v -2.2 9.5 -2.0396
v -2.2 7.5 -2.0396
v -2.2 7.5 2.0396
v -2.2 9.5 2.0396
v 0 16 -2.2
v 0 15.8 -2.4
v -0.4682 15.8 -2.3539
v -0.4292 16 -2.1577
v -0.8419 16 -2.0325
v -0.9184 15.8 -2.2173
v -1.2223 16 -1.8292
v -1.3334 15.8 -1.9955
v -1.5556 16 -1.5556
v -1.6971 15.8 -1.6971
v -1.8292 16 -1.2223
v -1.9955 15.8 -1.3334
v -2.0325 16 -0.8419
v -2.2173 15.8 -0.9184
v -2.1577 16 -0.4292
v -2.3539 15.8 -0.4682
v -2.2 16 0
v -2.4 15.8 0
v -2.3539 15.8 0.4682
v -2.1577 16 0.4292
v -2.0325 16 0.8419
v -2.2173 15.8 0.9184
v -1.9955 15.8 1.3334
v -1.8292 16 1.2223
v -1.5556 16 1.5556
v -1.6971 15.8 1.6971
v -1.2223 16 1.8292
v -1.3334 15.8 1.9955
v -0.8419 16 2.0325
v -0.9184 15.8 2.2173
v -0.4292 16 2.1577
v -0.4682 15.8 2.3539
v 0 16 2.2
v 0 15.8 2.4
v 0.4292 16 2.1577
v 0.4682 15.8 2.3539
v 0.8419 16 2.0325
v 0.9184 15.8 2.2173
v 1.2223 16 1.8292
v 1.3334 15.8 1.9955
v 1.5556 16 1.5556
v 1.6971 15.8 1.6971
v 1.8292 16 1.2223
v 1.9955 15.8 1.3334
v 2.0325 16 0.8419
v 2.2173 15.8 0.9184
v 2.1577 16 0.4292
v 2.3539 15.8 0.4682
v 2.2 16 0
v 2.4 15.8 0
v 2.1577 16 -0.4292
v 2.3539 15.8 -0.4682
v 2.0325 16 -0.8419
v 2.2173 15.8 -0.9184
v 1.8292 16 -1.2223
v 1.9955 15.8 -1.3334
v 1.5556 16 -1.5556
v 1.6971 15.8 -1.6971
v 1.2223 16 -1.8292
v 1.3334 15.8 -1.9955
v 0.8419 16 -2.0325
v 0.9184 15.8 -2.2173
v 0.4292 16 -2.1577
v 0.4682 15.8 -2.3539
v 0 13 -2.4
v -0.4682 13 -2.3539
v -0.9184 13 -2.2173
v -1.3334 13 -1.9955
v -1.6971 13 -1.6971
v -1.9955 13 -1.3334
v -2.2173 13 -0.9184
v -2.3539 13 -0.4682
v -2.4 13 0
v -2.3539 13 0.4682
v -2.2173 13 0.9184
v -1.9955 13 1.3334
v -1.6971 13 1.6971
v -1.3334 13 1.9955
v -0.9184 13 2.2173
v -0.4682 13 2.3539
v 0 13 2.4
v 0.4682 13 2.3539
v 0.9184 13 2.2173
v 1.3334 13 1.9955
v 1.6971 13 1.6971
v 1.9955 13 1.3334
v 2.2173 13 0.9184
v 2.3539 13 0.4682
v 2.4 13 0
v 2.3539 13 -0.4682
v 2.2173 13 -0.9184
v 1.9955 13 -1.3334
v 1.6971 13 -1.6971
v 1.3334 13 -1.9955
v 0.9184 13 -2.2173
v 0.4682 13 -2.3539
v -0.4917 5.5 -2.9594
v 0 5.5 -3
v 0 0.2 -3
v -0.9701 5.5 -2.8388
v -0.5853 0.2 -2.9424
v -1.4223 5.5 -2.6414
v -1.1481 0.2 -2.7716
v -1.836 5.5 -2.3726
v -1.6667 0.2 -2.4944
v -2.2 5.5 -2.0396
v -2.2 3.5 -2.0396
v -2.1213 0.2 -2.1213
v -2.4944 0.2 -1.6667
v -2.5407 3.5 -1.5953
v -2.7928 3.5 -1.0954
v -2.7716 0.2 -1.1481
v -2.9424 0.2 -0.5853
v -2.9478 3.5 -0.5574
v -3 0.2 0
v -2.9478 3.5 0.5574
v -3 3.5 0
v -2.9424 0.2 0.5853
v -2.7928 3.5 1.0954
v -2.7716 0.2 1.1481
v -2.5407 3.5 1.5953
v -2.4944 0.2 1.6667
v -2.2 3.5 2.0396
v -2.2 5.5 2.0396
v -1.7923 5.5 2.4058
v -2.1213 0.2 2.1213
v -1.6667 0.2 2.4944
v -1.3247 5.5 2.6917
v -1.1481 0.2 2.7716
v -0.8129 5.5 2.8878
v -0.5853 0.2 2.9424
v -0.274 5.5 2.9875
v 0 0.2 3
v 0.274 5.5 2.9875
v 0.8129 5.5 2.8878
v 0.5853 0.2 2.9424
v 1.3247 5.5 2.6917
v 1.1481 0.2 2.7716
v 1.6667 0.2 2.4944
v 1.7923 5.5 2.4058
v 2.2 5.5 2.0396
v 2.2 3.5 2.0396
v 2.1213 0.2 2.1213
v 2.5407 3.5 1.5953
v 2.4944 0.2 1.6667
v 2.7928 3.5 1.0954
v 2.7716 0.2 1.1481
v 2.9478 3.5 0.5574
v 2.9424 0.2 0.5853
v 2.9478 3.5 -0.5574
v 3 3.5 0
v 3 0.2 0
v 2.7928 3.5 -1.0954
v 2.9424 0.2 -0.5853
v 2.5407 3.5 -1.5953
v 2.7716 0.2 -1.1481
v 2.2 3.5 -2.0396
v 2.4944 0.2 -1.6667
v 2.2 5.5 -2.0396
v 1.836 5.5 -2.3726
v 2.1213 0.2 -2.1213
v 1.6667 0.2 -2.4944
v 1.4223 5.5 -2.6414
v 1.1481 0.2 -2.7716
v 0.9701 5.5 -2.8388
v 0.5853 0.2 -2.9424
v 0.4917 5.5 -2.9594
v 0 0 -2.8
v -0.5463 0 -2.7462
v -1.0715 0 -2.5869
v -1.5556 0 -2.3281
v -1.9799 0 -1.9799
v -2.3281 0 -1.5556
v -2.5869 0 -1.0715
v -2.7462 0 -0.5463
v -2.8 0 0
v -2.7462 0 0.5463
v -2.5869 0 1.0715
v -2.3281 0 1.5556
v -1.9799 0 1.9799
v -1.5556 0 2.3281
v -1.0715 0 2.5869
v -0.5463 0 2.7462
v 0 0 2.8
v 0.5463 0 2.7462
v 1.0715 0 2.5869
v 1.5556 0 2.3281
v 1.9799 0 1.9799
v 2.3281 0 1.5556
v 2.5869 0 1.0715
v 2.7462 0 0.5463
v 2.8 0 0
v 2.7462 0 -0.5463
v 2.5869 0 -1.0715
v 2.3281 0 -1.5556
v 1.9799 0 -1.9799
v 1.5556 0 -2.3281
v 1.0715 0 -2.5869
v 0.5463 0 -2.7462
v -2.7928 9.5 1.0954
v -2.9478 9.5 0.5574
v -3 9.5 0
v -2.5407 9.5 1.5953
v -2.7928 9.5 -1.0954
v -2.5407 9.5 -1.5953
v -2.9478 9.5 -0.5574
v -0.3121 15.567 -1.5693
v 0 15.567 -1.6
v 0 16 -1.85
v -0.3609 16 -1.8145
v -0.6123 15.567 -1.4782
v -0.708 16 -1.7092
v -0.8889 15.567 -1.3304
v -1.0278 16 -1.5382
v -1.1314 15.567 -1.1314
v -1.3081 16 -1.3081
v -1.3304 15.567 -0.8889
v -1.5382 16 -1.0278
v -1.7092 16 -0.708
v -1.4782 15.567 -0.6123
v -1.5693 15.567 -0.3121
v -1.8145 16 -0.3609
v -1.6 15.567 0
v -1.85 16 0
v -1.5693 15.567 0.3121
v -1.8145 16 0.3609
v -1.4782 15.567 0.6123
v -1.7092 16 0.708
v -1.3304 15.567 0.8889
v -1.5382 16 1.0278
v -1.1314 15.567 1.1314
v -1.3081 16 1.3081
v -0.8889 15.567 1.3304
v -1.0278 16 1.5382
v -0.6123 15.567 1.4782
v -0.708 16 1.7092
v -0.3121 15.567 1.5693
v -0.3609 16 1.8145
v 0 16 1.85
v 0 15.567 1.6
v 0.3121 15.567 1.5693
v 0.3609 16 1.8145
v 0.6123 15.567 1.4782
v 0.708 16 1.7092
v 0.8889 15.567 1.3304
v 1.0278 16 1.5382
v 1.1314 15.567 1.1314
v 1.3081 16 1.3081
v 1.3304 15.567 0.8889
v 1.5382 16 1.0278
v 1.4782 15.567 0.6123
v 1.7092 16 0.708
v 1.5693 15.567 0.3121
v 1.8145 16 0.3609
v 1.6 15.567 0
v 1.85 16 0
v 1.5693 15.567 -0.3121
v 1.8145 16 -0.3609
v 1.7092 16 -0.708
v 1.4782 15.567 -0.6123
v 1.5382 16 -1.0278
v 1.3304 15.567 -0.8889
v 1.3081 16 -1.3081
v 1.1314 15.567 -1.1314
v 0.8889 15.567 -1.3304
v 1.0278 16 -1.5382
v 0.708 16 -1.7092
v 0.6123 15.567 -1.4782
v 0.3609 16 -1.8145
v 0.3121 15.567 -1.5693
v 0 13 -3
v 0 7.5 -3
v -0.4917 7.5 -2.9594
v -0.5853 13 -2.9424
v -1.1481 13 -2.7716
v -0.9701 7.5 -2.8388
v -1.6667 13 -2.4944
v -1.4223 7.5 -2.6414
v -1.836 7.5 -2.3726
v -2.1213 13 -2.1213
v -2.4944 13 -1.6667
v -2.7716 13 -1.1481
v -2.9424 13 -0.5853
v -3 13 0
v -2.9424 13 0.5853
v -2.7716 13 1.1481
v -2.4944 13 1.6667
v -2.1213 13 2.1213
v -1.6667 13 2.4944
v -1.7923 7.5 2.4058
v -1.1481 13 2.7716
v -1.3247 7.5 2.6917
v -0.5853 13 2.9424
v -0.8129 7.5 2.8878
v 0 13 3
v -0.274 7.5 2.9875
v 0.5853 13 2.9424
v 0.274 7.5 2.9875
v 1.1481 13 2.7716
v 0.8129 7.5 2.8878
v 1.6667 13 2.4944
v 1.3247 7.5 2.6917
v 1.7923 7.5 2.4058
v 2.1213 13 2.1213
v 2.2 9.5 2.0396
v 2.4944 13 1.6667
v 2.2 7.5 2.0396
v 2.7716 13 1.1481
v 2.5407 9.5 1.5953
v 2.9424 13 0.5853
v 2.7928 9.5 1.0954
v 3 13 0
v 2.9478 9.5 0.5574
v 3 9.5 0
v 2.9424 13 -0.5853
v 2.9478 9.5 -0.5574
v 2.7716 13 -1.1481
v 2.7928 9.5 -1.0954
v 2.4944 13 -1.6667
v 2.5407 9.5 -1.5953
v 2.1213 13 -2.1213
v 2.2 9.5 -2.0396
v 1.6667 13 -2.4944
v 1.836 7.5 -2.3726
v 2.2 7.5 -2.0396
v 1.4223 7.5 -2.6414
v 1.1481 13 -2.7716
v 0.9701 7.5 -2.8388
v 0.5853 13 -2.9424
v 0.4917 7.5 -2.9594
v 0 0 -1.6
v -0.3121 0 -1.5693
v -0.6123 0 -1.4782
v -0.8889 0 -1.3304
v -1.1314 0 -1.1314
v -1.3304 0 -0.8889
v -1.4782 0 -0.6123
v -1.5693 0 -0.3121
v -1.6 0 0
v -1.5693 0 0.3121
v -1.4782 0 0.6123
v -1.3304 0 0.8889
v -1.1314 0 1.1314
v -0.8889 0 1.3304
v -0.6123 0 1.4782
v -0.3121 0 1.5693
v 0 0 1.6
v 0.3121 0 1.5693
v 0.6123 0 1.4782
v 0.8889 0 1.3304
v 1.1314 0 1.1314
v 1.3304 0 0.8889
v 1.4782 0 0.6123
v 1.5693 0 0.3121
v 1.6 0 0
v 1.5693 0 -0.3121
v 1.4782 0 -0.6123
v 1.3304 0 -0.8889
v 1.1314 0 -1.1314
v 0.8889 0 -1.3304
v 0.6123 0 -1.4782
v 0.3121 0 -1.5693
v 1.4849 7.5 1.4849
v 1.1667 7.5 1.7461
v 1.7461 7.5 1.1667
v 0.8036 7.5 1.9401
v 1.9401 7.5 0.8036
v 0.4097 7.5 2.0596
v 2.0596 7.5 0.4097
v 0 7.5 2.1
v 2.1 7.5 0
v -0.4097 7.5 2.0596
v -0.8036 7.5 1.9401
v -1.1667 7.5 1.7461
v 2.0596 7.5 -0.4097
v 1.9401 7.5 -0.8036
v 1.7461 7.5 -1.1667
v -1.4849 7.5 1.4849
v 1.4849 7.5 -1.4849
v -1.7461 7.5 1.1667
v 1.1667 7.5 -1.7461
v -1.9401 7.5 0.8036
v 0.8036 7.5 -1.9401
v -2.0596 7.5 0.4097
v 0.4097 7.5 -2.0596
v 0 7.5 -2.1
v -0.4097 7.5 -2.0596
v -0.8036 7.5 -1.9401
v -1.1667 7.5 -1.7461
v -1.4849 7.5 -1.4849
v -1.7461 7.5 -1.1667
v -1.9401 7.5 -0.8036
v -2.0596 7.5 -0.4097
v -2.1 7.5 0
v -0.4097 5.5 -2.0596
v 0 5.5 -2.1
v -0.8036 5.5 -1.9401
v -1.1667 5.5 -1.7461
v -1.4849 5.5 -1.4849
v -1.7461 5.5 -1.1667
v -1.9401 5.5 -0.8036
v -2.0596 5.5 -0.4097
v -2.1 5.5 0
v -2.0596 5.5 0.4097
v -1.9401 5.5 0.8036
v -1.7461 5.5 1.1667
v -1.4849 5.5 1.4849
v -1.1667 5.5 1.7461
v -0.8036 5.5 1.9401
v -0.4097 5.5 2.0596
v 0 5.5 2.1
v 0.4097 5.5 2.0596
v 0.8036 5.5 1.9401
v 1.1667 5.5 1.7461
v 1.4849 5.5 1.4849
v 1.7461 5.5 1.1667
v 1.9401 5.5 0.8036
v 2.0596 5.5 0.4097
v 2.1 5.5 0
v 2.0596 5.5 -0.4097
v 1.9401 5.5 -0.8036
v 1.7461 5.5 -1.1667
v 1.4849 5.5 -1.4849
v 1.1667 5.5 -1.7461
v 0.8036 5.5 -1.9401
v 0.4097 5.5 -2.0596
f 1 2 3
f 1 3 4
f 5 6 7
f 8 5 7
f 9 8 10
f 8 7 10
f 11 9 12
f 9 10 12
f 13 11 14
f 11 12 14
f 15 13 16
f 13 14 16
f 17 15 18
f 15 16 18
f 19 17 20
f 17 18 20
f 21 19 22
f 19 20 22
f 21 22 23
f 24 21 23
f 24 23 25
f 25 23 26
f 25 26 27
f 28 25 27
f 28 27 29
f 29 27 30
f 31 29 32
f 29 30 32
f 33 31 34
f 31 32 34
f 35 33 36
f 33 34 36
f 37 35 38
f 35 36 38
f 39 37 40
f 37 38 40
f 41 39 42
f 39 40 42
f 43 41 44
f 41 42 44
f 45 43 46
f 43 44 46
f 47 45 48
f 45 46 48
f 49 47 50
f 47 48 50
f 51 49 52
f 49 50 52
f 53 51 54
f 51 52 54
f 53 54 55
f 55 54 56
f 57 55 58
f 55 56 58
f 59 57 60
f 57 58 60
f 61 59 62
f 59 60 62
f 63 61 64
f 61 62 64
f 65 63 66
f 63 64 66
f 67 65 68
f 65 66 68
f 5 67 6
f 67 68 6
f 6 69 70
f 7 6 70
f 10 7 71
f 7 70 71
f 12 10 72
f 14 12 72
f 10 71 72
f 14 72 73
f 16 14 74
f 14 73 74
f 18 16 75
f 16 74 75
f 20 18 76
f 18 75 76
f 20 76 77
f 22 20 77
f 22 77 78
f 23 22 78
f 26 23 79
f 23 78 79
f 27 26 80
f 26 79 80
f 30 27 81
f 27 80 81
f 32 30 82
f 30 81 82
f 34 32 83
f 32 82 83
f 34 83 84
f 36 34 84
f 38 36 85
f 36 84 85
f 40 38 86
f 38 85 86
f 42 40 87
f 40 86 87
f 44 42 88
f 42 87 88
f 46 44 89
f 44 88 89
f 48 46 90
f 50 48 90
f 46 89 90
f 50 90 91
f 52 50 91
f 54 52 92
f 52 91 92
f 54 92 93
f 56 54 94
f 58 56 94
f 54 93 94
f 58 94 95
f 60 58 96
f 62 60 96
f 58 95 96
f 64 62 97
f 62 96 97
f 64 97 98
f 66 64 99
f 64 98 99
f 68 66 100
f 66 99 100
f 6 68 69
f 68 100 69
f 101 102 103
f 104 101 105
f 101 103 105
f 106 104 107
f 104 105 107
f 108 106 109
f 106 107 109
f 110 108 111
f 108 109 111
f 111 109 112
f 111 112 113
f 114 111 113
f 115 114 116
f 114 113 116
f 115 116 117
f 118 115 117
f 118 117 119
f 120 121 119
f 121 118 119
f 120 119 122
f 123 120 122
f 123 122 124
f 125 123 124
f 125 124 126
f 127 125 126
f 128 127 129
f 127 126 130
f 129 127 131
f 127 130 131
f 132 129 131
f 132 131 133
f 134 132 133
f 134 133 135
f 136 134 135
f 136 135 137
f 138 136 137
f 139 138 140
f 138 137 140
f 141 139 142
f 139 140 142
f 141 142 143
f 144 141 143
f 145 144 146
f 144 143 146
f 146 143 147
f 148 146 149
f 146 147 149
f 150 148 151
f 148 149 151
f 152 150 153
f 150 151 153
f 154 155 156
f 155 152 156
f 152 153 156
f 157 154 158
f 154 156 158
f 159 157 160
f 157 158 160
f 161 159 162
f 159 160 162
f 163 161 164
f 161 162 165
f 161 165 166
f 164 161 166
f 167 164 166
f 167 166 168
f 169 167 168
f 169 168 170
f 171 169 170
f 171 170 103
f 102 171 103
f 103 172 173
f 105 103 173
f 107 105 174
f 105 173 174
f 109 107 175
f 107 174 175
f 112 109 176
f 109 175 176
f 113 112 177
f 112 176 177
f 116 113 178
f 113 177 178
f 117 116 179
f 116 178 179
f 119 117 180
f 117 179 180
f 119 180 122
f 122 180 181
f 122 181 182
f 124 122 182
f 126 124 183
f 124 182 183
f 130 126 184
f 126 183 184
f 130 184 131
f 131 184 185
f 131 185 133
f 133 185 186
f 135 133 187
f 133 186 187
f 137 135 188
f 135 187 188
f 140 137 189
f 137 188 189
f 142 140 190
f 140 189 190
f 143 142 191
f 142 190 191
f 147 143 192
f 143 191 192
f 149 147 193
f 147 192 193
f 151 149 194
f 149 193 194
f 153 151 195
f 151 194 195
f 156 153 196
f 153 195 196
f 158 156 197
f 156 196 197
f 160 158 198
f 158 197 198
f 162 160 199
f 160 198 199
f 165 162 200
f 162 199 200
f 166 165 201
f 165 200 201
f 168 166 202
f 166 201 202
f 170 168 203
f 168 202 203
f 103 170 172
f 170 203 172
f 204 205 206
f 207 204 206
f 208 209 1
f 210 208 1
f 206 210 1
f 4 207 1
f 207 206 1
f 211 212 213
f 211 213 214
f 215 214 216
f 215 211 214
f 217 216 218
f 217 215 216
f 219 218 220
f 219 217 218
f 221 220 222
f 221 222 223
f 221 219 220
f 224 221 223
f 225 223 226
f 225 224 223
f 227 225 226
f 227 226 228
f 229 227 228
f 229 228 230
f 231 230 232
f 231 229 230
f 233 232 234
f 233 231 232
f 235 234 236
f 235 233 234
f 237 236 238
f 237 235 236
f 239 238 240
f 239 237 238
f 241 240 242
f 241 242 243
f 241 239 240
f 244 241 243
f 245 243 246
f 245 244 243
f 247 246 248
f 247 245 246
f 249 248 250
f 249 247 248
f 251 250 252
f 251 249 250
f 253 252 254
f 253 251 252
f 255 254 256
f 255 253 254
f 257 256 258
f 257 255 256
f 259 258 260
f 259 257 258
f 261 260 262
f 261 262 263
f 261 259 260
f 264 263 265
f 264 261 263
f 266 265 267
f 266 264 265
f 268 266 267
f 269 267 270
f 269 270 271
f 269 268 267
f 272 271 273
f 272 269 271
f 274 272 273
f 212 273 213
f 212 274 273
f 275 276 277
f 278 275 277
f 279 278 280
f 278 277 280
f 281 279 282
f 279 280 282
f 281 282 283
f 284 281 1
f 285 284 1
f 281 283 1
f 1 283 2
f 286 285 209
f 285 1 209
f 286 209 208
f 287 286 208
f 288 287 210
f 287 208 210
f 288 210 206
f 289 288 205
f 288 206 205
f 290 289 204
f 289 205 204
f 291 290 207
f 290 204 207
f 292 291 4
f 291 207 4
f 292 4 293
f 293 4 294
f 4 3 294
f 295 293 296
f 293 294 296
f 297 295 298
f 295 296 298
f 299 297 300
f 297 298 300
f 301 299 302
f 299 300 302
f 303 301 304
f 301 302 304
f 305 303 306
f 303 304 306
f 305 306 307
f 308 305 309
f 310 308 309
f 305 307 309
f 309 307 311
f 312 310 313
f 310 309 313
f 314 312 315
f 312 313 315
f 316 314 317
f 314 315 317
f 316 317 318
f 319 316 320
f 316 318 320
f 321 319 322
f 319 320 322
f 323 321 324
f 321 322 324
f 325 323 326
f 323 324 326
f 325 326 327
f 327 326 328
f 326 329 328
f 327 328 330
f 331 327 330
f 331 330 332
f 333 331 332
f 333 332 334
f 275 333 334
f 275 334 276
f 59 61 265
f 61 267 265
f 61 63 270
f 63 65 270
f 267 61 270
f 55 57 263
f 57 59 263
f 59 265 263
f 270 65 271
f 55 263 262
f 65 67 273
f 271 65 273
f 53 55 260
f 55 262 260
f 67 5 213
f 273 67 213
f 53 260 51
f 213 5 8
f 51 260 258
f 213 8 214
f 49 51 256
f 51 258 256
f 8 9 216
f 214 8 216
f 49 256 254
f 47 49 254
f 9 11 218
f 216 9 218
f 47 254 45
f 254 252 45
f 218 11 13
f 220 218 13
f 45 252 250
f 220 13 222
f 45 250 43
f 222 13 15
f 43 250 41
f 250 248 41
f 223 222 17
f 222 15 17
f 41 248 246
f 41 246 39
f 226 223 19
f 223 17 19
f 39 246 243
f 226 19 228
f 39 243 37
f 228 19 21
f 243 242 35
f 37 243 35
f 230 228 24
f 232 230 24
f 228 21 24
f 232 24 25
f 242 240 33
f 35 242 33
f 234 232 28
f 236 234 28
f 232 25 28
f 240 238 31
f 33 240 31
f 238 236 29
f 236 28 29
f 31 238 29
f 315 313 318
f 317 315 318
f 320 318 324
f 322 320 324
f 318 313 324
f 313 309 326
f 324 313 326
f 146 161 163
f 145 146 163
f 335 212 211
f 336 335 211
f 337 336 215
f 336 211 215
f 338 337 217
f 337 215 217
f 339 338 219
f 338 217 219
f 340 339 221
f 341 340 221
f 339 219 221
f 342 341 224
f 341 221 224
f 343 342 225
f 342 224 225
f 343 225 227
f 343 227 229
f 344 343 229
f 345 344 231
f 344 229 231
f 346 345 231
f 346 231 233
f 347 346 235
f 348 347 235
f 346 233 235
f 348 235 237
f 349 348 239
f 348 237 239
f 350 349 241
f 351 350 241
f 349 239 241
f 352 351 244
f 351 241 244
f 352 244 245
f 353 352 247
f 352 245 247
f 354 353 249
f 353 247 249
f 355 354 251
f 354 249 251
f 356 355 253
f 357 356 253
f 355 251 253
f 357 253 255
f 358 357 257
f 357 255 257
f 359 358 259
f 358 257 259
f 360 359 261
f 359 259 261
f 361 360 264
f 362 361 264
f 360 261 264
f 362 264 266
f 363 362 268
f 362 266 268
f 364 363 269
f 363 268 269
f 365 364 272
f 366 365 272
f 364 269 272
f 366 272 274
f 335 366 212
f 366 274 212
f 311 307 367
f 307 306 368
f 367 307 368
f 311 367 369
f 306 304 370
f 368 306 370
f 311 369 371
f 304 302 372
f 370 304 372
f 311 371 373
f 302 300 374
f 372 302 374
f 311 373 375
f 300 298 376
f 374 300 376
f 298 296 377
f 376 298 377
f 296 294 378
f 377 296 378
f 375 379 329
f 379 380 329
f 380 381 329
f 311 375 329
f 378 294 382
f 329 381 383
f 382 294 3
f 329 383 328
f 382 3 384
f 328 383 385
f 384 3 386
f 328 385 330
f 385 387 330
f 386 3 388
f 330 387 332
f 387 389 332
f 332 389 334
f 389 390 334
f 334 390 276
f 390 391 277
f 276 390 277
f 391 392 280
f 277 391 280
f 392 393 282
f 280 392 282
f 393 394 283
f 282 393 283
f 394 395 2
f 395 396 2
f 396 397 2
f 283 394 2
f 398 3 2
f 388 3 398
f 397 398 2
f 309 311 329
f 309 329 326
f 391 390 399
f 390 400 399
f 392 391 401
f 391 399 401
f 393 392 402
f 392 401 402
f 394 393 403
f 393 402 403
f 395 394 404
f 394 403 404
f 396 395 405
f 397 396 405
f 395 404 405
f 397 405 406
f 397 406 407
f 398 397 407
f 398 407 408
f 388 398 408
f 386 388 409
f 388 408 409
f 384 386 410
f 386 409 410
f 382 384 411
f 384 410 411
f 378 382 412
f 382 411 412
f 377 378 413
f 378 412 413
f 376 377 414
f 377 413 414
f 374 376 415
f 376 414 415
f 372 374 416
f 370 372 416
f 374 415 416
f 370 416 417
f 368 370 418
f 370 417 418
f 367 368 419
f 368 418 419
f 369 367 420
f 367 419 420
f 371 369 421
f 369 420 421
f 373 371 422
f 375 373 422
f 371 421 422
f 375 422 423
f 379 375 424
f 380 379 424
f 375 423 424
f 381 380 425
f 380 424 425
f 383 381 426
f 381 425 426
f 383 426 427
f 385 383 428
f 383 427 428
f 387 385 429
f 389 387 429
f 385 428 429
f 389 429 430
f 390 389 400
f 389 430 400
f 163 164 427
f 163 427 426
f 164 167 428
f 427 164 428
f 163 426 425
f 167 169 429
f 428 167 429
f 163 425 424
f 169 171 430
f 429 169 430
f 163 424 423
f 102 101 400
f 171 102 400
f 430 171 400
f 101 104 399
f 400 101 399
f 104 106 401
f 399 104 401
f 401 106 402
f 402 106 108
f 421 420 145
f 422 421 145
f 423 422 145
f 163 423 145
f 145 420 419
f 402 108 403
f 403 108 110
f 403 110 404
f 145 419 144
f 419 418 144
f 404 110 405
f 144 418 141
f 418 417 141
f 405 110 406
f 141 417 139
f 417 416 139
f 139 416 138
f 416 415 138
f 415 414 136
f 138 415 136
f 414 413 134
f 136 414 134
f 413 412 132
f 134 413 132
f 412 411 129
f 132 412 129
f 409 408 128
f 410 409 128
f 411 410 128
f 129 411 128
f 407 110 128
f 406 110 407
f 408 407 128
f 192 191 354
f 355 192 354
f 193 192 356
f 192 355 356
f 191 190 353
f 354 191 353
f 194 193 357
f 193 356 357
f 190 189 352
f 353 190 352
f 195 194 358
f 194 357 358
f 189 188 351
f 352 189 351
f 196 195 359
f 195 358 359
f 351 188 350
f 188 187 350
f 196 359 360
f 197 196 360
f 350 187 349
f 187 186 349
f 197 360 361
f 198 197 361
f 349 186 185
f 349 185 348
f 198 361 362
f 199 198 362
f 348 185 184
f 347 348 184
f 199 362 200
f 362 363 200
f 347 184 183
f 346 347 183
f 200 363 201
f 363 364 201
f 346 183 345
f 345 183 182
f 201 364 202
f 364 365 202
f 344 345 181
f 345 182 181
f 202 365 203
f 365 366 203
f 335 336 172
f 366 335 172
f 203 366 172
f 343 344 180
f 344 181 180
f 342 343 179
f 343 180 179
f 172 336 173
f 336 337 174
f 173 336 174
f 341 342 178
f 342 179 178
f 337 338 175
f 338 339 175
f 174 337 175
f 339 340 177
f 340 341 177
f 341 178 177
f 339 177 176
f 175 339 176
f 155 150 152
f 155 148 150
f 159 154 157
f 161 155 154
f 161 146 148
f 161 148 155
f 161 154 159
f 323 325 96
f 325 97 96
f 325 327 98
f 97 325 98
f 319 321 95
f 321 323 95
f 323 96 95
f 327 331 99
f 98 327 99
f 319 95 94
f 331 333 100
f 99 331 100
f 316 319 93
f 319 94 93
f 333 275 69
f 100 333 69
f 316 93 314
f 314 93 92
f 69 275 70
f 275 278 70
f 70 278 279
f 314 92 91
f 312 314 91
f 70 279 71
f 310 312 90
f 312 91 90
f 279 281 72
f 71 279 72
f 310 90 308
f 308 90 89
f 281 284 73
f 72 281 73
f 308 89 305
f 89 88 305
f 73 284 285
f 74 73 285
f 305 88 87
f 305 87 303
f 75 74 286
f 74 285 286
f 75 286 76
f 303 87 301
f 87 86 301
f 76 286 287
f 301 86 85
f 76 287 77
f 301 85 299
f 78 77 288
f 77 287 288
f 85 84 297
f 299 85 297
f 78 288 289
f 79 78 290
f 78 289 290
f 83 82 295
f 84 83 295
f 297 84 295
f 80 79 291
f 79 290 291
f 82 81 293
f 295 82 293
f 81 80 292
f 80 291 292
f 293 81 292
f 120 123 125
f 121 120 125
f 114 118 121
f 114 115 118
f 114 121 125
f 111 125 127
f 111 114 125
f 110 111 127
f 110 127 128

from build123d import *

# Parameters (mm, degrees)
CHAFL_N4_SIZE              = 0.2
CHAFL_N5_SIZE              = 0.25
CHAFL_N5_SIZE2             = 0.433012702
CORTAR_EXTRUIR2_DEPTH      = 17.552945357
CORTAR_EXTRUIR2_DEPTH_BACK = 17.552945357
CROQUIS4_W                 = 0.8
CROQUIS4_H                 = 6


with BuildPart() as part:
    # Croquis3 → Revolución1 (revolve)
    with BuildSketch(Plane.XY, mode=Mode.PRIVATE) as revoluci_n1_sk:
        Polygon((-1.6, 0), (-1.6, 16), (-2.4, 16), (-2.4, 13), (-3, 13), (-3, 7.5), (-2.1, 7.5), (-2.1, 5.5), (-3, 5.5), (-3, 0), align=None)
    revolve(revoluci_n1_sk.sketch.rotate(Axis((0, 0, 0), (0, 1, 0)), 270), axis=Axis((0, 0, 0), (0, 1, 0)))

    # Chaflán4
    chafl_n4_edges = [part.edges().sort_by_distance(p)[0] for p in [
        (0, 16, 2.4),
        (0, 0, 3),
    ]]
    chamfer(chafl_n4_edges, length=CHAFL_N4_SIZE)

    # Chaflán5
    chafl_n5_edges = [part.edges().sort_by_distance(p)[0] for p in [
        (0, 16, 1.6),
    ]]
    chafl_n5_side = [part.faces().sort_by_distance(p)[0] for p in [
        (0, 16, 2.137774603),
    ]]
    chamfer(chafl_n5_edges, length=CHAFL_N5_SIZE, length2=CHAFL_N5_SIZE2, reference=chafl_n5_side[0])

    # Croquis4 → Cortar-Extruir2 (cut, two sides: drawn at the far end of the back side and taken through both)
    with BuildSketch(Plane.XY.offset(-CORTAR_EXTRUIR2_DEPTH_BACK)):
        with Locations((-2.6, 6.5)):
            Rectangle(CROQUIS4_W, CROQUIS4_H)
        with Locations((2.6, 6.5)):
            Rectangle(CROQUIS4_W, CROQUIS4_H)
    extrude(amount=CORTAR_EXTRUIR2_DEPTH + CORTAR_EXTRUIR2_DEPTH_BACK, mode=Mode.SUBTRACT)


solid = part.part
